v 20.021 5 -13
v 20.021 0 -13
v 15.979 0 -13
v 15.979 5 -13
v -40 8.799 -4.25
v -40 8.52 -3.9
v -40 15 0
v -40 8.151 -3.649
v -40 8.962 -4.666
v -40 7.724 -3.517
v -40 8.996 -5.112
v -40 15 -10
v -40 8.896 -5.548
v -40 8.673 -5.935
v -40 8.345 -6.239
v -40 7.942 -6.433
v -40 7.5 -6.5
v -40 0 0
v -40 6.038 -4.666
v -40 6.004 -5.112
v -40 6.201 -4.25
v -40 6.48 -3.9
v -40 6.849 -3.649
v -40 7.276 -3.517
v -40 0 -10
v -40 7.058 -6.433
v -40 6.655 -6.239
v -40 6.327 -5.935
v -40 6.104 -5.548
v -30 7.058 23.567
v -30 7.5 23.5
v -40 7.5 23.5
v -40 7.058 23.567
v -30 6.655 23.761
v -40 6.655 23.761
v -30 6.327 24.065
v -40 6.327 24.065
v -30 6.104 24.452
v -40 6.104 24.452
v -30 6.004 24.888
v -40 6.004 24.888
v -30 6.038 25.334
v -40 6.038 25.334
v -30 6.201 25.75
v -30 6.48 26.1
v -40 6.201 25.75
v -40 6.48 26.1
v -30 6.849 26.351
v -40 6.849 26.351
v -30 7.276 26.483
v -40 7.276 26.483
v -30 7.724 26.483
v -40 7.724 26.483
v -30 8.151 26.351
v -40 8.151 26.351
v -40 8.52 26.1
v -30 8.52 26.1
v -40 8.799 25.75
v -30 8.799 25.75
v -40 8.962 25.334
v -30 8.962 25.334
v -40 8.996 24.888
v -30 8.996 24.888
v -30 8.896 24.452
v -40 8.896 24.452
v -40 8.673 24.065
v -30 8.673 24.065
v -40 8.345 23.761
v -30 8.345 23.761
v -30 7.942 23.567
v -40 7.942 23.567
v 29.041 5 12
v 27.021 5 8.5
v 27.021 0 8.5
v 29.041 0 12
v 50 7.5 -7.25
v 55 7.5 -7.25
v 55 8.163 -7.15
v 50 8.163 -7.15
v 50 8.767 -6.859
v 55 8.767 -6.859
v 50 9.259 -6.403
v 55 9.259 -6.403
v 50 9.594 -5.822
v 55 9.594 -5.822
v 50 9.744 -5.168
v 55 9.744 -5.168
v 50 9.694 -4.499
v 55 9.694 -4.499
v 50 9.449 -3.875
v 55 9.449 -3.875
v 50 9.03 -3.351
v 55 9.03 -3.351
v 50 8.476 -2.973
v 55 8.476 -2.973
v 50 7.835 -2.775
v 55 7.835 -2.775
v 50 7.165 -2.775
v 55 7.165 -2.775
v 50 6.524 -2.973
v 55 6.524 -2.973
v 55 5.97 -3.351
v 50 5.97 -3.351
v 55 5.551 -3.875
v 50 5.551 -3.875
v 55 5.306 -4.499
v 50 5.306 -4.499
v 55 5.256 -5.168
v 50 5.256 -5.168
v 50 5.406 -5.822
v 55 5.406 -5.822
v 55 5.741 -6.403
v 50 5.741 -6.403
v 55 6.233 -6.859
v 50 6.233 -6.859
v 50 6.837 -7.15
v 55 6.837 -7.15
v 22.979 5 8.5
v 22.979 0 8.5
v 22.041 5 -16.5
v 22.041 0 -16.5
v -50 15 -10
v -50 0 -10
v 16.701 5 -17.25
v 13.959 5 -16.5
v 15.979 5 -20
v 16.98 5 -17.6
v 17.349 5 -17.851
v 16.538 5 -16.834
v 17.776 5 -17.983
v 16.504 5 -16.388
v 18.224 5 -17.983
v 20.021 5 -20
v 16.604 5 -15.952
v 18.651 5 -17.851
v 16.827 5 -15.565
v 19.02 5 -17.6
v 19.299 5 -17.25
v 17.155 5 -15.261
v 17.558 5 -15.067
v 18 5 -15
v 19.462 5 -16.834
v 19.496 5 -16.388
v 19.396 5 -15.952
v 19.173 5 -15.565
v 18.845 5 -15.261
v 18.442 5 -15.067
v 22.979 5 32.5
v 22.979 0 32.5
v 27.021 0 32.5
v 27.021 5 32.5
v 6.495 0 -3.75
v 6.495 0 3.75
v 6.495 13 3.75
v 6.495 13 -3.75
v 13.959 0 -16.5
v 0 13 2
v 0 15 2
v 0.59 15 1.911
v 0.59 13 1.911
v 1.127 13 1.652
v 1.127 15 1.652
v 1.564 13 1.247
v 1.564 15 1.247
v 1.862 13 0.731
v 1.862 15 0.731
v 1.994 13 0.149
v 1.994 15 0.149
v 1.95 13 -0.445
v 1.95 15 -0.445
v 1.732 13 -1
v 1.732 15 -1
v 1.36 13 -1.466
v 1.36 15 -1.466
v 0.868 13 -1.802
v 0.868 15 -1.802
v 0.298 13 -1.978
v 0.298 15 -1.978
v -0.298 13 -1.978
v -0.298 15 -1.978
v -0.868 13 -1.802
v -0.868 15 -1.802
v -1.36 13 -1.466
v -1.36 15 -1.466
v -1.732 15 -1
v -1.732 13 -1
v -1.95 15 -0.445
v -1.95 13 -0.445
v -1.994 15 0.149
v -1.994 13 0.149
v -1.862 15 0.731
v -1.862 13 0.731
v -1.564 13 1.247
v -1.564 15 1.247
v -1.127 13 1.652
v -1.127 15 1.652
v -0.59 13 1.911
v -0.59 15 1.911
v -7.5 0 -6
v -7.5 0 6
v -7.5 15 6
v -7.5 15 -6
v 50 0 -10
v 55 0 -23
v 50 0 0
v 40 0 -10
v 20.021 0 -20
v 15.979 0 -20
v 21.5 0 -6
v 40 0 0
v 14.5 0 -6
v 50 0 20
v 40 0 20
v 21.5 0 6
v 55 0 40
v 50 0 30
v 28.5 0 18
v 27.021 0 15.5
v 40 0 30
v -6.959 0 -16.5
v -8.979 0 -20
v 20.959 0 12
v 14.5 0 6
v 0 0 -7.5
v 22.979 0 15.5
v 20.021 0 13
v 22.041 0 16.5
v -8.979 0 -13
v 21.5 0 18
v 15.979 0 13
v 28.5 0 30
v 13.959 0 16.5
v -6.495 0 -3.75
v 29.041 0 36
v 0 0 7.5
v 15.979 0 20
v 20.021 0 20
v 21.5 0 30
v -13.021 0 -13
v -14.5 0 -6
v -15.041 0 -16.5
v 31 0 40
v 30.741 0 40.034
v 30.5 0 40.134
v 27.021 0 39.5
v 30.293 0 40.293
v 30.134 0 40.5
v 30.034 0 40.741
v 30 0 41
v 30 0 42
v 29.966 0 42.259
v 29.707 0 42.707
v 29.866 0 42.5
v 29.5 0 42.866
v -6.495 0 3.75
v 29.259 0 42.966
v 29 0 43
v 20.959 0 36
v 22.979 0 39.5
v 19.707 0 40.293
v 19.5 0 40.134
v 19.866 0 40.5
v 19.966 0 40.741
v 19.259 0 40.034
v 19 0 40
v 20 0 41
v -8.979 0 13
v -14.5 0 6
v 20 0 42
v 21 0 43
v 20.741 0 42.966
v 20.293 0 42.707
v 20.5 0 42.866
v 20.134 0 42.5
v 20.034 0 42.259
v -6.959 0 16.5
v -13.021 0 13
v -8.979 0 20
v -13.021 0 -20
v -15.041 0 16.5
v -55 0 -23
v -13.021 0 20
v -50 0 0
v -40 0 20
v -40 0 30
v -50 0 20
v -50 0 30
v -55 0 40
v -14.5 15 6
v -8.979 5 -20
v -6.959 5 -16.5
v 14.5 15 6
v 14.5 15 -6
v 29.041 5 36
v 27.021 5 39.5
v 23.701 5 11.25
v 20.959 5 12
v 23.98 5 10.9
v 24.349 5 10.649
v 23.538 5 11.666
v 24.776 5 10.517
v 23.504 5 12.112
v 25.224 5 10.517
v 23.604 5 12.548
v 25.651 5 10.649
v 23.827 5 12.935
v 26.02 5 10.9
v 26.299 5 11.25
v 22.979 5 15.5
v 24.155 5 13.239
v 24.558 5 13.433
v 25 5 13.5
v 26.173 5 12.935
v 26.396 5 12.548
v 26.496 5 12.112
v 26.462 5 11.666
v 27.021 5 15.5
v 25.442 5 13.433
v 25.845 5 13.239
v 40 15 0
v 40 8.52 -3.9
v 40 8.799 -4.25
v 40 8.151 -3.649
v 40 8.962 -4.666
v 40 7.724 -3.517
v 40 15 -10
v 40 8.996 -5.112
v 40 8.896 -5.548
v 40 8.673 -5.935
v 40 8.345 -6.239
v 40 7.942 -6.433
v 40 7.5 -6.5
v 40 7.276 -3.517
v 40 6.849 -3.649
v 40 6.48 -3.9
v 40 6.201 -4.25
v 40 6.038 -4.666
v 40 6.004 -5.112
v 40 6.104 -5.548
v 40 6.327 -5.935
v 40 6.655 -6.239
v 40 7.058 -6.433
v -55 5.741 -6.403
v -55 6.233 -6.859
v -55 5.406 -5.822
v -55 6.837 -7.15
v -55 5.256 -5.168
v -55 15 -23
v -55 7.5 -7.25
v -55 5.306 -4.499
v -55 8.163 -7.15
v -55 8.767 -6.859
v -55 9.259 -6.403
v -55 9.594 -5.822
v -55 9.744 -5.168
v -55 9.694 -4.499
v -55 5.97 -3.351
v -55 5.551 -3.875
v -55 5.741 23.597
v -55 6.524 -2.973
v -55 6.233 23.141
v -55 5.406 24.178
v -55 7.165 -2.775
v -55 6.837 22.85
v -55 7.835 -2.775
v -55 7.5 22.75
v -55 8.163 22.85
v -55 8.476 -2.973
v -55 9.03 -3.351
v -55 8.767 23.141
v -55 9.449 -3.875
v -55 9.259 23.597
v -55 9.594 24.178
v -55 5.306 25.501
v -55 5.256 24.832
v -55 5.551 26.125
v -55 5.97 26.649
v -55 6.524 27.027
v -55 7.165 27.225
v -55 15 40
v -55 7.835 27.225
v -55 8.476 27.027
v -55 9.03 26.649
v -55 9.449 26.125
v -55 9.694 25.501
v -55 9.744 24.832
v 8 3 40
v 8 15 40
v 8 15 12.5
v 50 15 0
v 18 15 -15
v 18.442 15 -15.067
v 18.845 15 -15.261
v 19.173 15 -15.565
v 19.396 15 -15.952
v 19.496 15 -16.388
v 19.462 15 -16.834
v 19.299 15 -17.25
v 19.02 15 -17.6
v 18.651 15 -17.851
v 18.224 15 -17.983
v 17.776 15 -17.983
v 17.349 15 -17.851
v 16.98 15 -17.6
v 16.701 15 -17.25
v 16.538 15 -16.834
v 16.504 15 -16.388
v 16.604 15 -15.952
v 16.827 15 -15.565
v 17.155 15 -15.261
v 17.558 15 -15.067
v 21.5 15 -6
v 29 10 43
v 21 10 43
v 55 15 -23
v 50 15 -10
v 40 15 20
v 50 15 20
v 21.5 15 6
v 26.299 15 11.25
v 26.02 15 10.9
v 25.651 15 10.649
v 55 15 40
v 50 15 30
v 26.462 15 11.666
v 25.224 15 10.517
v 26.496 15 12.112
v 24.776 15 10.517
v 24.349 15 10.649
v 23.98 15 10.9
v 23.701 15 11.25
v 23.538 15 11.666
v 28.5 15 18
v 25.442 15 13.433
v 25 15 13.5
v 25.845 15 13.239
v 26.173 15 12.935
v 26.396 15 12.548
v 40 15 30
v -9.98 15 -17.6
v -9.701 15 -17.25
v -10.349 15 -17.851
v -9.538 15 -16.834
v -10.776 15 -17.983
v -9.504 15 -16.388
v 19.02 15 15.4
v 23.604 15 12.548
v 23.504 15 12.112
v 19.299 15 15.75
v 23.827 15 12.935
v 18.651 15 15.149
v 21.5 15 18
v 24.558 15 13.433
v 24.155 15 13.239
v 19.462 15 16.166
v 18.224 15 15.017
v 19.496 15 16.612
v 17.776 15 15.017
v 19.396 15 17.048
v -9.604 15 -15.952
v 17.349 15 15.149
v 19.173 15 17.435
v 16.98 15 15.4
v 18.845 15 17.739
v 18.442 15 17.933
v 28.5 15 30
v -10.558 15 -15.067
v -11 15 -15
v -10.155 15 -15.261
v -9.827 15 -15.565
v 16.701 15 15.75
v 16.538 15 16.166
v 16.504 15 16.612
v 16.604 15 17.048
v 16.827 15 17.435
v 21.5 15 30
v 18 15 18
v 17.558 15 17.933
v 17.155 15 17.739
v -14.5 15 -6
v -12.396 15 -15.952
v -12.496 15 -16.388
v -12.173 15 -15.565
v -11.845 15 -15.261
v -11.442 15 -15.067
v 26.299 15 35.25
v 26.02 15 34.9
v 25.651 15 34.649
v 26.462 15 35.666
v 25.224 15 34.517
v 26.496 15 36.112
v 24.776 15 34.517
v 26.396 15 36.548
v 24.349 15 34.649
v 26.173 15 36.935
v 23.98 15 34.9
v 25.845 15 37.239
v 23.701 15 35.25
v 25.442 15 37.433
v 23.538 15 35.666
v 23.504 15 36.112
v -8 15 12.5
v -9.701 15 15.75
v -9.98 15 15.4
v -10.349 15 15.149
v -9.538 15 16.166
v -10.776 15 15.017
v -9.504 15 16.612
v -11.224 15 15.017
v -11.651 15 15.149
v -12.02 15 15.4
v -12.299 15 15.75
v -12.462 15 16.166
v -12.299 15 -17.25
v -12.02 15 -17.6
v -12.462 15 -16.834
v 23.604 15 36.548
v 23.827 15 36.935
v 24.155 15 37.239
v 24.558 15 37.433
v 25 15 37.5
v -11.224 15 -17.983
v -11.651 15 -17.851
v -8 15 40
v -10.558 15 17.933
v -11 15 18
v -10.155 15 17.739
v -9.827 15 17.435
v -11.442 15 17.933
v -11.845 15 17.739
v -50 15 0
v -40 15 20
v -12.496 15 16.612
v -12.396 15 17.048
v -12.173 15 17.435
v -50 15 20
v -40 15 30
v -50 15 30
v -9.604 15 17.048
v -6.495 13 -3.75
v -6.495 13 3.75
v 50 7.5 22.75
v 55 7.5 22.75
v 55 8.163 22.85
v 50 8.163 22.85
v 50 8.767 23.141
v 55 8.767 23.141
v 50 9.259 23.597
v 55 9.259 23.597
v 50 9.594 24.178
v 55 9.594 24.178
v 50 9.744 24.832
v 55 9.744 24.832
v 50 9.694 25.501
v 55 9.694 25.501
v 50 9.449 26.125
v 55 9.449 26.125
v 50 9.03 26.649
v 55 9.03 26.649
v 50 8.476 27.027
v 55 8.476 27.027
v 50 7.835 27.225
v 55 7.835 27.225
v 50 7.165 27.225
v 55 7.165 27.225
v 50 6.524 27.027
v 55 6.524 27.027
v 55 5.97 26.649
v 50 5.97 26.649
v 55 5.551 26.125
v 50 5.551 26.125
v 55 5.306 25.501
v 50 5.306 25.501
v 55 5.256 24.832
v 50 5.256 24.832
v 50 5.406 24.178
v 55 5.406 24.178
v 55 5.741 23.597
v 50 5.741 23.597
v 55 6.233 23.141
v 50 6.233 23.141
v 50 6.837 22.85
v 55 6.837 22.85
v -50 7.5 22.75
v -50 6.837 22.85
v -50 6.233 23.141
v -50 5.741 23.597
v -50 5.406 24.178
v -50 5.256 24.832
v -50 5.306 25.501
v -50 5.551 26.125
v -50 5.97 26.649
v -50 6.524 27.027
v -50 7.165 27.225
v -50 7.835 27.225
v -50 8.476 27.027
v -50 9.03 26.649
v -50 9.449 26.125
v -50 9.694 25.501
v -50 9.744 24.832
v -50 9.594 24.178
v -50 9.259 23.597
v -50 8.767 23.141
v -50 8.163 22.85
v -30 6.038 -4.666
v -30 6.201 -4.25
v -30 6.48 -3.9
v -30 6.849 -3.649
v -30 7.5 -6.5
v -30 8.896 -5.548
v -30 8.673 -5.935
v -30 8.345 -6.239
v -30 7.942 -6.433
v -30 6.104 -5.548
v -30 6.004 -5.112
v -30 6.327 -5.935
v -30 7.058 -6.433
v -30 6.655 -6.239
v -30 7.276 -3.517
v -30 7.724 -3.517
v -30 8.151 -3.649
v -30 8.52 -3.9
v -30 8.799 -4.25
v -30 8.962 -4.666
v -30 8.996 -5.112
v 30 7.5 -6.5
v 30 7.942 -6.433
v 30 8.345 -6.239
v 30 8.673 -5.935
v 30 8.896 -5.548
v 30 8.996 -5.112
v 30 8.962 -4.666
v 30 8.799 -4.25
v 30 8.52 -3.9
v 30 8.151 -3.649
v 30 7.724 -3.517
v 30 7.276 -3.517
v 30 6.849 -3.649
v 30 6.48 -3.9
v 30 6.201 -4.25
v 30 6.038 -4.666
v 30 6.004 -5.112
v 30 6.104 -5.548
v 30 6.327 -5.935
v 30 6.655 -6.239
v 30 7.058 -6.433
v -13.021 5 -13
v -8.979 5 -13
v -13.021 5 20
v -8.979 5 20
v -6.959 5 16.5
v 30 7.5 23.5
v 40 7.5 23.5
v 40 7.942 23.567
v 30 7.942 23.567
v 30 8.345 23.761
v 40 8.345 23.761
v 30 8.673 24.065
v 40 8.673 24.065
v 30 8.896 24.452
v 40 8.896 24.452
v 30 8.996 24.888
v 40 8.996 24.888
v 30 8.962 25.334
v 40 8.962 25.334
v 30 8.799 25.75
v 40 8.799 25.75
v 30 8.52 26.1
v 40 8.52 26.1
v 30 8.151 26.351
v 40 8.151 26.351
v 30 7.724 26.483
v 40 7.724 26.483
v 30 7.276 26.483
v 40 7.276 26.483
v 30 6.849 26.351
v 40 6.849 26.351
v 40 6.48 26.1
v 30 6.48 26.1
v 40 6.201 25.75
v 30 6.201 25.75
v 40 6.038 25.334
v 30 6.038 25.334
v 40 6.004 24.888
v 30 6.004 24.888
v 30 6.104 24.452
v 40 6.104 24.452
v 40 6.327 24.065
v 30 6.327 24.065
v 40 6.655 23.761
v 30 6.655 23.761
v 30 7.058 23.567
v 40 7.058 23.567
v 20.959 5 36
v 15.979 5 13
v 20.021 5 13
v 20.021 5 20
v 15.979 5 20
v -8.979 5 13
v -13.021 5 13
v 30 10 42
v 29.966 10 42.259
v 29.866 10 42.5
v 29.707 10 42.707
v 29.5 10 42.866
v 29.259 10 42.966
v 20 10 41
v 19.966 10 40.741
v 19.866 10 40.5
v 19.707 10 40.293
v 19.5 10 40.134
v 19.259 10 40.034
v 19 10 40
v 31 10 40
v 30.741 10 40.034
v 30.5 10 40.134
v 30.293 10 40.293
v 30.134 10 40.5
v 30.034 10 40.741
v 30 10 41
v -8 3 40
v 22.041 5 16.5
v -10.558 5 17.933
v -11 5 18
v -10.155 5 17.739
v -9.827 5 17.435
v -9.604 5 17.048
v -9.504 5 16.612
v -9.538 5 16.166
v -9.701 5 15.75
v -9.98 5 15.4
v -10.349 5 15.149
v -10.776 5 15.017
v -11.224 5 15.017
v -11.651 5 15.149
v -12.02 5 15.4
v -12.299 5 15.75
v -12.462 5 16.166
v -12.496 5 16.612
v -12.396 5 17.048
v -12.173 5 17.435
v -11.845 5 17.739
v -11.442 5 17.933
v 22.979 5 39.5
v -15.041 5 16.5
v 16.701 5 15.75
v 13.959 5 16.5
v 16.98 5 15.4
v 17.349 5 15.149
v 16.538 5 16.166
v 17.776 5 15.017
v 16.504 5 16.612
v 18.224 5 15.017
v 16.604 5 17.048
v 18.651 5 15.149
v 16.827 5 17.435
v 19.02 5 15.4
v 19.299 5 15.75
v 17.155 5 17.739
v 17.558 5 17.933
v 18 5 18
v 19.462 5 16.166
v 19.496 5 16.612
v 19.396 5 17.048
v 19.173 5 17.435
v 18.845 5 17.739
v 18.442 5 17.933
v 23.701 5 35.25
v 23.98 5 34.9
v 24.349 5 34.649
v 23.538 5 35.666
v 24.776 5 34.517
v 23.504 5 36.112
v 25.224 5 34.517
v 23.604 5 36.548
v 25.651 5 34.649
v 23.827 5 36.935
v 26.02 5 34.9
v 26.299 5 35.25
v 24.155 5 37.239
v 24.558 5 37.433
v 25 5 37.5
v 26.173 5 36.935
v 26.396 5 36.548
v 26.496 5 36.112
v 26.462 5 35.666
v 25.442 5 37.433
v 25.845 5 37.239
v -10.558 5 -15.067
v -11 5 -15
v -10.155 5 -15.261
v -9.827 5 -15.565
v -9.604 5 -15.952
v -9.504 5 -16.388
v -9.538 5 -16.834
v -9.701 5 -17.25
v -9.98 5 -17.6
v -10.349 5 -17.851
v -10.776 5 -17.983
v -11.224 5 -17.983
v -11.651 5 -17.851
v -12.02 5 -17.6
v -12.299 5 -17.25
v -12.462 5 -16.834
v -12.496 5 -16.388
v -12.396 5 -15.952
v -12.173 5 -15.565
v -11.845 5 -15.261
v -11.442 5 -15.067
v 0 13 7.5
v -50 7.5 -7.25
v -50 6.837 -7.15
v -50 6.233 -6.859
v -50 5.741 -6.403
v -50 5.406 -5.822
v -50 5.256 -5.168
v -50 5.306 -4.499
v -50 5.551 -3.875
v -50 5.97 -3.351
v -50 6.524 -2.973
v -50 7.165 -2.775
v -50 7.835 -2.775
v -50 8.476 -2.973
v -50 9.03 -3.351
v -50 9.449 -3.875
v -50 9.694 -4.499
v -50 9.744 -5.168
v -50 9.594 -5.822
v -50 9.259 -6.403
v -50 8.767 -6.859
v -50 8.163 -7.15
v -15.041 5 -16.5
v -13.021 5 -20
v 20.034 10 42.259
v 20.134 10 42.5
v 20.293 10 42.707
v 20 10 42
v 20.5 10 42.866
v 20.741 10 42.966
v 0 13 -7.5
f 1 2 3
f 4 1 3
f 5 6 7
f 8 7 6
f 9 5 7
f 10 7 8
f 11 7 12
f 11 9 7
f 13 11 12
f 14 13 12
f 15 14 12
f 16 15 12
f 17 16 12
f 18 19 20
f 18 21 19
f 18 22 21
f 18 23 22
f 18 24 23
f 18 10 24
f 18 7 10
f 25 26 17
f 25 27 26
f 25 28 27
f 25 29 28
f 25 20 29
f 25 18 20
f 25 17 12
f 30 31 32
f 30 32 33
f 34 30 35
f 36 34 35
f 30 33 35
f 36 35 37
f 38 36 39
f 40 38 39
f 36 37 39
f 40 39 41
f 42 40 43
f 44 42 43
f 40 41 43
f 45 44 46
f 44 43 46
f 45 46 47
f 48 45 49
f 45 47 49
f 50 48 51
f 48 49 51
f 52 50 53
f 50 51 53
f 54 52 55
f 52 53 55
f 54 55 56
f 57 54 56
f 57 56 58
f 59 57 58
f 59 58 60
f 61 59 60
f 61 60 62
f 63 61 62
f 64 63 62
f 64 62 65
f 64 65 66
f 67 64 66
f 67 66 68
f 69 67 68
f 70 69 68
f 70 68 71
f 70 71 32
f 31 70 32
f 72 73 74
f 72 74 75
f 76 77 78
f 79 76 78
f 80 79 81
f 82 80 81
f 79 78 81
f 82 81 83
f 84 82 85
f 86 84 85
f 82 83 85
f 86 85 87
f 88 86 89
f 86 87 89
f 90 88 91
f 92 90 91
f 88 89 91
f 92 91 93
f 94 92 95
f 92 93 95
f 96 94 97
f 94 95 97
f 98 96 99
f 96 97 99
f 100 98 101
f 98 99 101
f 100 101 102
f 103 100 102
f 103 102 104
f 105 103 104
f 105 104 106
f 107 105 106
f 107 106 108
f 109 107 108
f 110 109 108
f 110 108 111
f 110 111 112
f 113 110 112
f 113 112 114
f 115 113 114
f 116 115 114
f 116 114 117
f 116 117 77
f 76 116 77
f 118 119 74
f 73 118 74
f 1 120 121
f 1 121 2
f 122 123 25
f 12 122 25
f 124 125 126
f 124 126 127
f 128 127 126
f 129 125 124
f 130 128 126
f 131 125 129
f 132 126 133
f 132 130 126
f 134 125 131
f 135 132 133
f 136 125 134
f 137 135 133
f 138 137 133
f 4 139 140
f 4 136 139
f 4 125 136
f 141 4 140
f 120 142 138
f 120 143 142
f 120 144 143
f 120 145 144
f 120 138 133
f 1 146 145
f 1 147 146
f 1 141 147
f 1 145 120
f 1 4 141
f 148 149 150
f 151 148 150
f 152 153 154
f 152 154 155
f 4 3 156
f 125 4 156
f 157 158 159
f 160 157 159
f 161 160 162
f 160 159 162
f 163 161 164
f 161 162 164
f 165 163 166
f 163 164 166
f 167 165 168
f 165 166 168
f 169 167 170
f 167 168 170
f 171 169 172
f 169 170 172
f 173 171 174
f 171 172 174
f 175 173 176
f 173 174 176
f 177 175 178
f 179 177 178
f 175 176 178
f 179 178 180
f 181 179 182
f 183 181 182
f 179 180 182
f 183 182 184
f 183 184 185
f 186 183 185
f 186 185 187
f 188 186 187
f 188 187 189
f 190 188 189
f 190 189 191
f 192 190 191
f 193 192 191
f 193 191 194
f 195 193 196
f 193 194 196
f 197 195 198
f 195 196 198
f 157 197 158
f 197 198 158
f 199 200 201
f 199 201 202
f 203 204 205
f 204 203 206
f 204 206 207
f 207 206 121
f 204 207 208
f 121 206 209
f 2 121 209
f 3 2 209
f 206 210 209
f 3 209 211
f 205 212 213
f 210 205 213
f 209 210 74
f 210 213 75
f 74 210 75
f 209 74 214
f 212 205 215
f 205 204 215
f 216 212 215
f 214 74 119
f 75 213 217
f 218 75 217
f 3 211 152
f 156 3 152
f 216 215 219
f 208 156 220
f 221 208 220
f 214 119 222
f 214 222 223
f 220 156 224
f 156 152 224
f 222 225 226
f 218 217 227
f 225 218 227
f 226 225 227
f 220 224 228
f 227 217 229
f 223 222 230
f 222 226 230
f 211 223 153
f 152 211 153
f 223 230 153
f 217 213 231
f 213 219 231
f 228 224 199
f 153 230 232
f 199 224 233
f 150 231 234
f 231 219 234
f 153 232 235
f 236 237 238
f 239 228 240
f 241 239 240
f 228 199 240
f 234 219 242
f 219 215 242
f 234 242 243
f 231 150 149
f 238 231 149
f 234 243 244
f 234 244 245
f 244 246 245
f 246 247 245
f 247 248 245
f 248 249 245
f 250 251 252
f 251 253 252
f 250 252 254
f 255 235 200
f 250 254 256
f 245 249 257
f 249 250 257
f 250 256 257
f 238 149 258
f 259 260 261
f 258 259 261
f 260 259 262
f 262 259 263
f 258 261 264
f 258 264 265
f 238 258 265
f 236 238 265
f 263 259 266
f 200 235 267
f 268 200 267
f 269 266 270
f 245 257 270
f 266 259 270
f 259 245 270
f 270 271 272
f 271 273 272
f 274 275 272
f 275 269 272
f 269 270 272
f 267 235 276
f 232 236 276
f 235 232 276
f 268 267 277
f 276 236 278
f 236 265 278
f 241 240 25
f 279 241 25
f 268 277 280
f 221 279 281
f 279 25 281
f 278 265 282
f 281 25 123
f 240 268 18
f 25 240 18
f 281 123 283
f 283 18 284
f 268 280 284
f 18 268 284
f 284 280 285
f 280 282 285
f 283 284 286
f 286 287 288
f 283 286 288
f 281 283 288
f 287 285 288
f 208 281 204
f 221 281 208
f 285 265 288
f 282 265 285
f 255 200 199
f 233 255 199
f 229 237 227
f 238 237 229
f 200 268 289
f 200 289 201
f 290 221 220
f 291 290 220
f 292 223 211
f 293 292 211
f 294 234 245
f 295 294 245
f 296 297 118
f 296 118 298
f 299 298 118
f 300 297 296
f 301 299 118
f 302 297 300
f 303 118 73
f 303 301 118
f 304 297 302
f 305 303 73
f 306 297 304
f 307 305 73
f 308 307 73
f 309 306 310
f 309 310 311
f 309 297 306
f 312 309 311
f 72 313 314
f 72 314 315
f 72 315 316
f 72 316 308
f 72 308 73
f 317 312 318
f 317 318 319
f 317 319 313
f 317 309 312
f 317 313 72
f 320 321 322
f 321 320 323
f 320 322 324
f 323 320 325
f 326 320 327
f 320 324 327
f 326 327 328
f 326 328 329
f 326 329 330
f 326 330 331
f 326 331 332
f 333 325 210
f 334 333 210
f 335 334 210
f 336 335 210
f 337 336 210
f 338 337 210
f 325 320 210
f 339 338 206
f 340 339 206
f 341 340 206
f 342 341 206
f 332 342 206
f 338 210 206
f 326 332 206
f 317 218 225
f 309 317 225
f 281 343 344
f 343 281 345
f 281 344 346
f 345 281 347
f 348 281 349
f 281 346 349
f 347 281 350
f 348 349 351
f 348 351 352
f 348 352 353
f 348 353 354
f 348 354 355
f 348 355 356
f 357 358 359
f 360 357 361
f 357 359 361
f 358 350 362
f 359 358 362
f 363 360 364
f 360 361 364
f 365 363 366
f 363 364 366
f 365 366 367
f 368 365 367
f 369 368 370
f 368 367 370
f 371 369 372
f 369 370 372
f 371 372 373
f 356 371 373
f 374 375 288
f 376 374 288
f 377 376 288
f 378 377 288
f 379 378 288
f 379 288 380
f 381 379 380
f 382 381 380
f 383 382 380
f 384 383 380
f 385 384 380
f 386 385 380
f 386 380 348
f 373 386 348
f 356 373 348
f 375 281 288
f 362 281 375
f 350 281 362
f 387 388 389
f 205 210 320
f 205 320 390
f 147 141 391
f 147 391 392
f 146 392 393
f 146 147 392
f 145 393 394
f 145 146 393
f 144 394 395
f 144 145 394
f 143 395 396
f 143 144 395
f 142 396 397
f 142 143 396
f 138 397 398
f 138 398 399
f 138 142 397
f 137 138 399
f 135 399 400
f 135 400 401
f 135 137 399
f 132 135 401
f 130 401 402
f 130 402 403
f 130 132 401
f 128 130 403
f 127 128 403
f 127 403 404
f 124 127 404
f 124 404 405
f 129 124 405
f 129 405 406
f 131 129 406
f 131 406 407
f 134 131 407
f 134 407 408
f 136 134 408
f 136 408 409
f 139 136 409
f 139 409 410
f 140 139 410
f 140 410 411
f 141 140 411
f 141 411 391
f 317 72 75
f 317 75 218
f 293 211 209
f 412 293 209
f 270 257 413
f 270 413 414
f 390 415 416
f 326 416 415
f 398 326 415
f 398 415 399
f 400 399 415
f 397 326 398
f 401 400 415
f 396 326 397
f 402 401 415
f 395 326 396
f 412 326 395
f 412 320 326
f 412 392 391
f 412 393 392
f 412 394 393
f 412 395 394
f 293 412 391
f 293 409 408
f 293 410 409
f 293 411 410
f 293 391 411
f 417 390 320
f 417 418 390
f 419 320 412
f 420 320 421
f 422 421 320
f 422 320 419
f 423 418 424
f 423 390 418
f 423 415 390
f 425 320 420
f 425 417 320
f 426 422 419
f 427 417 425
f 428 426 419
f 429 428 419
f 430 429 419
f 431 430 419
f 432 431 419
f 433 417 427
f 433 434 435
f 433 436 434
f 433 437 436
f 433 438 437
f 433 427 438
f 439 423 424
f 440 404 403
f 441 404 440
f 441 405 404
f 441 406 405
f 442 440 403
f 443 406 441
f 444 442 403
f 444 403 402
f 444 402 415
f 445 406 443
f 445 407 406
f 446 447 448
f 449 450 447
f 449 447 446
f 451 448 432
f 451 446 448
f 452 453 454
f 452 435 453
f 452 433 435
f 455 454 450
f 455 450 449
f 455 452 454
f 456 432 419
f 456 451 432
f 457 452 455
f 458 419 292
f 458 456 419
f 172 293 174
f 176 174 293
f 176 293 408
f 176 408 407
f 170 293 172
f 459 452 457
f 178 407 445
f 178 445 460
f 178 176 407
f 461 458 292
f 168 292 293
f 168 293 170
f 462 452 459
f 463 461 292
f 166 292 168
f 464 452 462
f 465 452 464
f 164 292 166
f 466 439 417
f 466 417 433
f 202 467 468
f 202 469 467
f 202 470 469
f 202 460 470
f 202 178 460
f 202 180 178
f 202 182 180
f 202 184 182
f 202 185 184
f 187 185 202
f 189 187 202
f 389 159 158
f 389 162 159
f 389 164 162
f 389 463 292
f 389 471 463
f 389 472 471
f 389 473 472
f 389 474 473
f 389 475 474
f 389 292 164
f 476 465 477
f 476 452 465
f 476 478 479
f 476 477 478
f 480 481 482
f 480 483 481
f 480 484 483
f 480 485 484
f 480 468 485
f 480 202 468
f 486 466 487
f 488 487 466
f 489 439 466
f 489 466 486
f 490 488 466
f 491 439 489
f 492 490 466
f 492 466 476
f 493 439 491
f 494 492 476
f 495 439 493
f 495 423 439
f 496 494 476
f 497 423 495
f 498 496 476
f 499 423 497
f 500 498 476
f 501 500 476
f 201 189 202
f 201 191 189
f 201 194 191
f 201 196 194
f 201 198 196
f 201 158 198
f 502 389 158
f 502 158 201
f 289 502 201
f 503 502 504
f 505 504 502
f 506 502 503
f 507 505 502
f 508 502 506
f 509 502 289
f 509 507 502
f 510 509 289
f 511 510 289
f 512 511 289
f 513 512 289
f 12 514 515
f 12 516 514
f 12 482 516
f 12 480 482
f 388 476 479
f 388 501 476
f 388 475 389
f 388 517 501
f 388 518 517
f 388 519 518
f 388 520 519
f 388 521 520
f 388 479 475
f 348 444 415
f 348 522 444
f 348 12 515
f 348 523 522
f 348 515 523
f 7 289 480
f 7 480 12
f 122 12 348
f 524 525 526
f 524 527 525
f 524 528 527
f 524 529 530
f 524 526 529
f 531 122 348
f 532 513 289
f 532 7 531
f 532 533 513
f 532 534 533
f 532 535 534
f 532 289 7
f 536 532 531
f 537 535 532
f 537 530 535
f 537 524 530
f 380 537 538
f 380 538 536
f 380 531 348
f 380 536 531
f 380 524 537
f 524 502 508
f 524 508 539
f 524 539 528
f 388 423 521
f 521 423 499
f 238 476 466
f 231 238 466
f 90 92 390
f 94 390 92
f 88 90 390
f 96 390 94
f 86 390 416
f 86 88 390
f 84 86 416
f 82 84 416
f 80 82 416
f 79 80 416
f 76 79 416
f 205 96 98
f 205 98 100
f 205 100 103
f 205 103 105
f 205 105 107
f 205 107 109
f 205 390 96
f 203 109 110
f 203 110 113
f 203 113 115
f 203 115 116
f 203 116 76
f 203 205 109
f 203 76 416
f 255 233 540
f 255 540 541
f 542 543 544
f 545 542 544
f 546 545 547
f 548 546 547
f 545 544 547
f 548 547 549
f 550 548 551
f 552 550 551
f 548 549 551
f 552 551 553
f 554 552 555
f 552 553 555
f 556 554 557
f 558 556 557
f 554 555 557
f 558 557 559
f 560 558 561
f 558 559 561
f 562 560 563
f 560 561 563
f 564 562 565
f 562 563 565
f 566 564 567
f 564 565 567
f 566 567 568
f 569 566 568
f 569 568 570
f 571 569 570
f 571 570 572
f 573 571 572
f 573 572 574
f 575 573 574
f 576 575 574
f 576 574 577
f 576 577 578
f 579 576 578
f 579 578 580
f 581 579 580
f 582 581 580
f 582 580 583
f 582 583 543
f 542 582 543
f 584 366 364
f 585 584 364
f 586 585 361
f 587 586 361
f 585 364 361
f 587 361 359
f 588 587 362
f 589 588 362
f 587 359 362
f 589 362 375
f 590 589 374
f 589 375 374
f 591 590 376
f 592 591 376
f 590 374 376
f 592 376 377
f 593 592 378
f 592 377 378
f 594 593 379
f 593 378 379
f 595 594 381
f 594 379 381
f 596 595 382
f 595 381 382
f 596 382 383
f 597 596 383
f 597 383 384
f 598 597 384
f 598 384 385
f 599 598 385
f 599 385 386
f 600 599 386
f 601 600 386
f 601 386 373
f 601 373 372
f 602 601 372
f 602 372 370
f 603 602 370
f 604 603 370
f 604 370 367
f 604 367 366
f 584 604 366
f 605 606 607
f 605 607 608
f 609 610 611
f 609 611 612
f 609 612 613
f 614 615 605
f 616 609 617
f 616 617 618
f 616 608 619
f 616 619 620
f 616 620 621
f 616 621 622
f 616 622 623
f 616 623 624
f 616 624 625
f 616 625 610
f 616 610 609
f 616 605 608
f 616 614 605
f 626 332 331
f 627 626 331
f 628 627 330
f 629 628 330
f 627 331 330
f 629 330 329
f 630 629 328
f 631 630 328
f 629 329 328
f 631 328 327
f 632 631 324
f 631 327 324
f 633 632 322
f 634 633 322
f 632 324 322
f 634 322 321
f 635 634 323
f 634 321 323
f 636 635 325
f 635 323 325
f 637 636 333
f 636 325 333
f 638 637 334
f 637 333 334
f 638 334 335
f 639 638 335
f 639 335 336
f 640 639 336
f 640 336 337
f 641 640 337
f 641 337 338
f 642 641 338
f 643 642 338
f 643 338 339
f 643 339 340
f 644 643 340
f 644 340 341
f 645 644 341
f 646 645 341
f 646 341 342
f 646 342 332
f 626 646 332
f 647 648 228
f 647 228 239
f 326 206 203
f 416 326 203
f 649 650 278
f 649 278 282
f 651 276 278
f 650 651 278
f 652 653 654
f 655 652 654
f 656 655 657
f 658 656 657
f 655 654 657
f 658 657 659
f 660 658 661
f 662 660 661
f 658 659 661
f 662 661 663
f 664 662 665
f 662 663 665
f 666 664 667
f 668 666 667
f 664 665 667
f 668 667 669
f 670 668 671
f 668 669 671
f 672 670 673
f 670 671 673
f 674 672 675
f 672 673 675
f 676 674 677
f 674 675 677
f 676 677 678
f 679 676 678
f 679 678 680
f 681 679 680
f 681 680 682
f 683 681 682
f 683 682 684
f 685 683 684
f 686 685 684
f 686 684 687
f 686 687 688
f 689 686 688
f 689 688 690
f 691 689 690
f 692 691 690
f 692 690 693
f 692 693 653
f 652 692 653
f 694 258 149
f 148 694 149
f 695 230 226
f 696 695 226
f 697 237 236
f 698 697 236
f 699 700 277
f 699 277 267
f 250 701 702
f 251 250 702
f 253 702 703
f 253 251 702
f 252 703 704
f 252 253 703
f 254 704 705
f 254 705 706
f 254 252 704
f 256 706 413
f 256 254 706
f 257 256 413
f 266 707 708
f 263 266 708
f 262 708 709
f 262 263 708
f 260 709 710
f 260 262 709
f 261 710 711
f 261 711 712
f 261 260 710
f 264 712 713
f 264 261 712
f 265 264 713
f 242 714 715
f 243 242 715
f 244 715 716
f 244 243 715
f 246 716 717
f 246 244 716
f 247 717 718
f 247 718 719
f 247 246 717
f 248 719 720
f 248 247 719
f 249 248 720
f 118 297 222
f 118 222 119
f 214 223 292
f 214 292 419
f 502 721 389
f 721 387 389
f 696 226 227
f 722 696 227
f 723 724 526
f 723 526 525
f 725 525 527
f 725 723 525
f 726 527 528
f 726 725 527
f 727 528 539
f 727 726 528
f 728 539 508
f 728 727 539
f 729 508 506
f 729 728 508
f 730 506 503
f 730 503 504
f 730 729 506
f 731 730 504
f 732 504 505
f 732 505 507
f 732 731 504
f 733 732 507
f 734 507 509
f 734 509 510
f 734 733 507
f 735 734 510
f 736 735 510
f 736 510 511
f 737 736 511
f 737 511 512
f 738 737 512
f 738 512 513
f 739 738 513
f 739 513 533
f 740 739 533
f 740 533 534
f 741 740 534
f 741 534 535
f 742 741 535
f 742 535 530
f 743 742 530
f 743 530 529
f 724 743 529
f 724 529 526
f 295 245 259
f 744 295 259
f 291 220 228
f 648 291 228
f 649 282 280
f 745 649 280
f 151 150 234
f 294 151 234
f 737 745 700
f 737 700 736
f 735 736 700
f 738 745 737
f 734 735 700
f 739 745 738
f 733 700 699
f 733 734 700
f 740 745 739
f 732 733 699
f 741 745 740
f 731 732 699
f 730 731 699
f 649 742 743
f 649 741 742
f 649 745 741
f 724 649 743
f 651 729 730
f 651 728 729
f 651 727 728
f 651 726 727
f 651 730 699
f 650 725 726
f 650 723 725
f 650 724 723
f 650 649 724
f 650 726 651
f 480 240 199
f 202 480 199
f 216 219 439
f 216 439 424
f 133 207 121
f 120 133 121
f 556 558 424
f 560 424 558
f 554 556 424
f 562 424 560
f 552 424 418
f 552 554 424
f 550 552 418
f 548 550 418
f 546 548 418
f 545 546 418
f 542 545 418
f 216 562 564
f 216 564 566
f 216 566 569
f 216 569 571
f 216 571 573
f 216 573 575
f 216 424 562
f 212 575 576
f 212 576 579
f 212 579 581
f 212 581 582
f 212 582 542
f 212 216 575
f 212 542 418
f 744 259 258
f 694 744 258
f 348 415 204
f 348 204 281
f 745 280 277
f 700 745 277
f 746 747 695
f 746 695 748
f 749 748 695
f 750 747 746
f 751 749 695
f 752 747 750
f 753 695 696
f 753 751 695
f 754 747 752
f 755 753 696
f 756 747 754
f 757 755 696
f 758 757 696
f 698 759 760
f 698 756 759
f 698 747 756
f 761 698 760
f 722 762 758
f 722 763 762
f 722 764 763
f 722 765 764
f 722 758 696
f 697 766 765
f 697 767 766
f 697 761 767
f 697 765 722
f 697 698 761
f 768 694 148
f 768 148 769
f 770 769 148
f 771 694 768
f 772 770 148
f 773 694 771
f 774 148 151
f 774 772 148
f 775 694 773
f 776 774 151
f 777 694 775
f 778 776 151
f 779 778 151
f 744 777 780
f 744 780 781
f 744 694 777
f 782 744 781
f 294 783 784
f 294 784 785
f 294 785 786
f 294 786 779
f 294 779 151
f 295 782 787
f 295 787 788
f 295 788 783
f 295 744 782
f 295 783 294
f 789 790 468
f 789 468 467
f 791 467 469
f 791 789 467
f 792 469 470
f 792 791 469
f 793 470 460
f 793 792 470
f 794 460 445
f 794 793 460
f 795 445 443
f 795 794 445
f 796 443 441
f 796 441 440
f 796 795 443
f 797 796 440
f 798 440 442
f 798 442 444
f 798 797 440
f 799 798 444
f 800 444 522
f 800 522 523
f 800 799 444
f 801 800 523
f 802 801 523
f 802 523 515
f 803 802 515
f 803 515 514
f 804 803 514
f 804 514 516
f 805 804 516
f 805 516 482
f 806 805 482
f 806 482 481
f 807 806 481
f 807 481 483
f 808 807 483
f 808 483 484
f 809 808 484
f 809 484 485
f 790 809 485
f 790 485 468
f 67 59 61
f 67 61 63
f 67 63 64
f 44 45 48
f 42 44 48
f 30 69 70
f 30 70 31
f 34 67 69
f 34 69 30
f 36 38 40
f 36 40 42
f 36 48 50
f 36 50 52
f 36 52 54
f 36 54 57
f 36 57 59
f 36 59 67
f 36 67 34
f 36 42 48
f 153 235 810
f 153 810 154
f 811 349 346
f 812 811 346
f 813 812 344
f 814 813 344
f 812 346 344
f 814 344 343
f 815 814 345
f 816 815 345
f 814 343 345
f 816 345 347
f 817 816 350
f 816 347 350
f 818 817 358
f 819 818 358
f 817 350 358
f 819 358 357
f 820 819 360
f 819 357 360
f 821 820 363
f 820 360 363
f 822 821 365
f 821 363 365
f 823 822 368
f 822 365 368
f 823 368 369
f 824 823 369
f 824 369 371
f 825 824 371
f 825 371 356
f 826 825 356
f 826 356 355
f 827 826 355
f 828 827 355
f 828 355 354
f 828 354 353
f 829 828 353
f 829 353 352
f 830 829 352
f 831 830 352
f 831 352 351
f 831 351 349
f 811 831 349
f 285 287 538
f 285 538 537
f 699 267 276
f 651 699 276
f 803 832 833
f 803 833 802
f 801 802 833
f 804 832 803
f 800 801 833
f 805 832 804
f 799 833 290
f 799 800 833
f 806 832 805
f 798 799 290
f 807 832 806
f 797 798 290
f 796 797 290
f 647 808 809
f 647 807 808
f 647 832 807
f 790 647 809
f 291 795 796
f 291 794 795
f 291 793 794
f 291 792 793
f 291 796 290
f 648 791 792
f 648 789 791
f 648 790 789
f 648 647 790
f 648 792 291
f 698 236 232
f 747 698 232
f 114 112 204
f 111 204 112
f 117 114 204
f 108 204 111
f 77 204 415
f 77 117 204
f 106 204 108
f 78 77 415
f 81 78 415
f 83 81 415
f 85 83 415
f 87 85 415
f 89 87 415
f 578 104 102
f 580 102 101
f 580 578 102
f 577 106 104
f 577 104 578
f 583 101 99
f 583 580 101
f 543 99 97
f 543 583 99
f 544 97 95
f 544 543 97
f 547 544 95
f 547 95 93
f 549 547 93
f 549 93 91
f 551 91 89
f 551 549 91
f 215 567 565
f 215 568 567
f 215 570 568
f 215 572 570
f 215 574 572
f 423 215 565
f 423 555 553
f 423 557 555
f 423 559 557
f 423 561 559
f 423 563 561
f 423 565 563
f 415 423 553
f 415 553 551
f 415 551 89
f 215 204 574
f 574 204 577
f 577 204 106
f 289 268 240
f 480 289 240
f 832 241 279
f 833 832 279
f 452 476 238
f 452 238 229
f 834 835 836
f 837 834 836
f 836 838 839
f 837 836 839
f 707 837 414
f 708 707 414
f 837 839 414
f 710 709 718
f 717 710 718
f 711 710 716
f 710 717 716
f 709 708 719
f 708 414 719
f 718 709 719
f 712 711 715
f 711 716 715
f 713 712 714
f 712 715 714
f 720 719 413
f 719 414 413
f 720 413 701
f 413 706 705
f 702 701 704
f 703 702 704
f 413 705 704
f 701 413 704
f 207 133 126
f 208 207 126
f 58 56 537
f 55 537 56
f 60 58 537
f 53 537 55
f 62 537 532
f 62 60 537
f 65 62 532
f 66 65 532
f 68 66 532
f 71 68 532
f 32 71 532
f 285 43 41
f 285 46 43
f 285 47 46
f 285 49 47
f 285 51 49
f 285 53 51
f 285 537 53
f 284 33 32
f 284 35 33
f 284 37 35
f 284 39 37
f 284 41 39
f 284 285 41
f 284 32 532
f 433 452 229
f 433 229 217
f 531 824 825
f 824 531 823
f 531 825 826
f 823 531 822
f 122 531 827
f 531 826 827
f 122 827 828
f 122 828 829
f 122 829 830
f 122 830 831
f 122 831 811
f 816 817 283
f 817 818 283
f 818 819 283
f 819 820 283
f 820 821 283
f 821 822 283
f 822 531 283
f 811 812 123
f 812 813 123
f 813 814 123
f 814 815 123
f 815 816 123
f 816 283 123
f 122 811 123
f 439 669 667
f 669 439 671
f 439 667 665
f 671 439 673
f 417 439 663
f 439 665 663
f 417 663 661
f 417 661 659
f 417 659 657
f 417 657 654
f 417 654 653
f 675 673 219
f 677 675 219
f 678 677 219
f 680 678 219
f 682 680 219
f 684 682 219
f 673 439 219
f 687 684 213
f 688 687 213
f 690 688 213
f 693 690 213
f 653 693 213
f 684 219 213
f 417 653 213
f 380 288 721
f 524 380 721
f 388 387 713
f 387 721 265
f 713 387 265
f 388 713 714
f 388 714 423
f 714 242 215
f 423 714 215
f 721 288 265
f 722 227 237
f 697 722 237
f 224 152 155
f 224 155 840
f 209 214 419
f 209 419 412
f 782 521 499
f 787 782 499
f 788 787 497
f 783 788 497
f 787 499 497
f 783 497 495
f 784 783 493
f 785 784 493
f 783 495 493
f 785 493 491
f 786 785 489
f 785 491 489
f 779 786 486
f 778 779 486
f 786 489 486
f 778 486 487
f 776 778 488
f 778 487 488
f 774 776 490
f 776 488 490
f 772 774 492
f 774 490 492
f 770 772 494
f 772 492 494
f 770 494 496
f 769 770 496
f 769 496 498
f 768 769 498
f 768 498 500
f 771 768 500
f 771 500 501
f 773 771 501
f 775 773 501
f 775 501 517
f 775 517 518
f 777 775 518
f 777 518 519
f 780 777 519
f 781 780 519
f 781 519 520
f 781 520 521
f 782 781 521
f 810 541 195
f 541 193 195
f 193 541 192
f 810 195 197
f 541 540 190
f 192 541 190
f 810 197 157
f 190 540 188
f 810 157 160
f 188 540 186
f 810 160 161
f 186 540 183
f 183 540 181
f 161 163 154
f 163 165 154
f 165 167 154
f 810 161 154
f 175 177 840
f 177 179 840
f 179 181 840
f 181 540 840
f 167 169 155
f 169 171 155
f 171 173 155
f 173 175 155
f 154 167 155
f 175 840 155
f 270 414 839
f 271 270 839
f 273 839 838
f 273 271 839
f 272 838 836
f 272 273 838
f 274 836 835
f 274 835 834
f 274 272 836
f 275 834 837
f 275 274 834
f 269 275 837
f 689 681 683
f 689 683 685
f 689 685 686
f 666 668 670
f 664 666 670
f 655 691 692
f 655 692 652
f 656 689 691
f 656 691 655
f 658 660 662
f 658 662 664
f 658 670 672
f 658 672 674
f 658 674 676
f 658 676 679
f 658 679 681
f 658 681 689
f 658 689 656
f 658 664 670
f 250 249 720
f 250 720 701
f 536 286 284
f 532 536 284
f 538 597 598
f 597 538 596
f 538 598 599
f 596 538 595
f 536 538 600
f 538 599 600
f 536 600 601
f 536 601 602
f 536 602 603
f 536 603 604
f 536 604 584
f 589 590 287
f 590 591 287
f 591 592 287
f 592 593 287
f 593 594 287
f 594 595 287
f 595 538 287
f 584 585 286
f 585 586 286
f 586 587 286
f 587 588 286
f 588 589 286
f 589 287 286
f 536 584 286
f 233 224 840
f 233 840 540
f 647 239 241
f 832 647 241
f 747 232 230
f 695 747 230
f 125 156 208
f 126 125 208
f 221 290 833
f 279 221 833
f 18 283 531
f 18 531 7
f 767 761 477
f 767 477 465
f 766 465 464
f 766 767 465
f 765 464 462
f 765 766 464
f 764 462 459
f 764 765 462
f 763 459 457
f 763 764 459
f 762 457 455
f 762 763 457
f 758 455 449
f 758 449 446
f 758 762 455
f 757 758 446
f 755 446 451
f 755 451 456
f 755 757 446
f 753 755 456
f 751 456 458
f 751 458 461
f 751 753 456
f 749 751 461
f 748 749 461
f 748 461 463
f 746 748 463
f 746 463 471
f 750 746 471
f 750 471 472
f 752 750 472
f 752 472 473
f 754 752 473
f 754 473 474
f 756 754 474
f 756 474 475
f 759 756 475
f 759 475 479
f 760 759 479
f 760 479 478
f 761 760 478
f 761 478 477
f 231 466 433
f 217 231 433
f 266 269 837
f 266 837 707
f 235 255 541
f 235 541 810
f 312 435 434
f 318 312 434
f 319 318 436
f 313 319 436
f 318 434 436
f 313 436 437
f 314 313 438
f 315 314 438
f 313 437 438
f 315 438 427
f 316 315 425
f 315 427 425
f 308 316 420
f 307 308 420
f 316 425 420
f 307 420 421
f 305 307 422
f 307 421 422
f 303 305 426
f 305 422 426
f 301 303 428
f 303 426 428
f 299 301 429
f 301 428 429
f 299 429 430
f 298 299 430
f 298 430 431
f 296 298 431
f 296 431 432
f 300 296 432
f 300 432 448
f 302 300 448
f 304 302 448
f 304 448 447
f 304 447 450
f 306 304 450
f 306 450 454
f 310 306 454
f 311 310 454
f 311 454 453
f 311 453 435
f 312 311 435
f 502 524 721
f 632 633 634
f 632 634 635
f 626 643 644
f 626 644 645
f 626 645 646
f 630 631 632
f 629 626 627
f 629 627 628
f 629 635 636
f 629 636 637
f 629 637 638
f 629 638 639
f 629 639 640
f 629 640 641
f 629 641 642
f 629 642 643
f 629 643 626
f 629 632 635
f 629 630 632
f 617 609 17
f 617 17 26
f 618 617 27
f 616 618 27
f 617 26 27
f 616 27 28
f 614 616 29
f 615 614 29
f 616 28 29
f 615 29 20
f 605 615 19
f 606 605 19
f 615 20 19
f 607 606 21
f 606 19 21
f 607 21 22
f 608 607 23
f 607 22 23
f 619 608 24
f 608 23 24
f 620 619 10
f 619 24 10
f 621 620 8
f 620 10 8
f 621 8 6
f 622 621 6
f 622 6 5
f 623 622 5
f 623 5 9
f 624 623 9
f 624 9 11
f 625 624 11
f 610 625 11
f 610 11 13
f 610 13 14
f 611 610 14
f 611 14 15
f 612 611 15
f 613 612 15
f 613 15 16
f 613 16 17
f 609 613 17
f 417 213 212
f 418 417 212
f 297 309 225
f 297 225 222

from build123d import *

# Parameters (mm, degrees)
CROQUIS1_W              = 80
CROQUIS1_H              = 60
CROQUIS1_R              = 1.5
CROQUIS1_W_2            = 7
CROQUIS1_H_2            = 25
CROQUIS1_W_3            = 10
CROQUIS1_H_3            = 20
CROQUIS1_H_4            = 10
CROQUIS1_W_4            = 5
CROQUIS1_H_5            = 6.5
SALIENTE_EXTRUIR1_DEPTH = 15
CORTAR_EXTRUIR1_DEPTH   = 5
CROQUIS3_R              = 1.5
CORTAR_EXTRUIR2_DEPTH   = 25
CROQUIS6_R              = 1.5
CORTAR_EXTRUIR3_DEPTH   = 25
CROQUIS8_W              = 15
CROQUIS8_H              = 17.838651154
CROQUIS8_R              = 2
SALIENTE_EXTRUIR2_DEPTH = 2
CORTAR_EXTRUIR4_START   = -55
CORTAR_EXTRUIR4_DEPTH   = 8
CROQUIS10_R             = 1.5
CROQUIS10_W             = 7
CROQUIS10_H             = 12
CORTAR_EXTRUIR5_DEPTH   = 16
CROQUIS12_W             = 110
CROQUIS12_H             = 15
SALIENTE_EXTRUIR3_DEPTH = 3
CORTAR_EXTRUIR6_DEPTH   = 5
SALIENTE_EXTRUIR4_DEPTH = 10
CROQUIS15_R             = 2.25
CORTAR_EXTRUIR7_DEPTH   = 10
CROQUIS16_R             = 2.25
CORTAR_EXTRUIR8_DEPTH   = 10


with BuildPart() as part:
    # Croquis1 → Saliente-Extruir1 (new body)
    with BuildSketch(Plane(origin=(0, 0, 0), x_dir=(1, 0, 0), z_dir=(0, 1, 0))):
        with Locations((0, -10)):
            Rectangle(CROQUIS1_W, CROQUIS1_H)
        with Locations(Location((18, -16.5, 0), (0, 0, 270))):
            Circle(CROQUIS1_R, mode=Mode.SUBTRACT)
        with Locations(Location((-11, -16.5, 0), (0, 0, 270))):
            Circle(CROQUIS1_R, mode=Mode.SUBTRACT)
        with Locations(Location((18, 16.5, 0), (0, 0, 270))):
            Circle(CROQUIS1_R, mode=Mode.SUBTRACT)
        with Locations(Location((-11, 16.5, 0), (0, 0, 270))):
            Circle(CROQUIS1_R, mode=Mode.SUBTRACT)
        with Locations((18, 0)):
            Rectangle(CROQUIS1_W_2, CROQUIS1_H_2, mode=Mode.SUBTRACT)
        Polygon((6.495190528, 3.75), (0, 7.5), (-6.495190528, 3.75), (-6.495190528, -3.75), (0, -7.5), (6.495190528, -3.75), align=None, mode=Mode.SUBTRACT)
        with Locations((-11, 0)):
            Rectangle(CROQUIS1_W_2, CROQUIS1_H_2, mode=Mode.SUBTRACT)
        with Locations((-45, -10)):
            Rectangle(CROQUIS1_W_3, CROQUIS1_H_3)
        with Locations((-45, -35)):
            Rectangle(CROQUIS1_W_3, CROQUIS1_H_4)
        with Locations((-52.5, -10)):
            Rectangle(CROQUIS1_W_4, CROQUIS1_H)
        with Locations((-45, 15)):
            Rectangle(CROQUIS1_W_3, CROQUIS1_H_4)
        with Locations((45, 15)):
            Rectangle(CROQUIS1_W_3, CROQUIS1_H_4)
        with Locations((52.5, -10)):
            Rectangle(CROQUIS1_W_4, CROQUIS1_H)
        with Locations((45, -10)):
            Rectangle(CROQUIS1_W_3, CROQUIS1_H_3)
        with Locations((45, -35)):
            Rectangle(CROQUIS1_W_3, CROQUIS1_H_4)
        with Locations((-11, 9.25)):
            Rectangle(CROQUIS1_W_2, CROQUIS1_H_5)
        with Locations((-11, -9.25)):
            Rectangle(CROQUIS1_W_2, CROQUIS1_H_5)
        with Locations((18, 9.25)):
            Rectangle(CROQUIS1_W_2, CROQUIS1_H_5)
        with Locations((18, -9.25)):
            Rectangle(CROQUIS1_W_2, CROQUIS1_H_5)
    extrude(amount=SALIENTE_EXTRUIR1_DEPTH)

    # Croquis2 → Cortar-Extruir1 (cut)
    with BuildSketch(Plane.XZ):
        Polygon((-6.958548116, 16.5), (-8.979274058, 20), (-13.020725942, 20), (-15.041451884, 16.5), (-13.020725942, 13), (-8.979274058, 13), align=None)
        Polygon((22.041451884, 16.5), (20.020725942, 20), (15.979274058, 20), (13.958548116, 16.5), (15.979274058, 13), (20.020725942, 13), align=None)
        Polygon((-6.958548116, -16.5), (-8.979274058, -13), (-13.020725942, -13), (-15.041451884, -16.5), (-13.020725942, -20), (-8.979274058, -20), align=None)
        Polygon((22.041451884, -16.5), (20.020725942, -13), (15.979274058, -13), (13.958548116, -16.5), (15.979274058, -20), (20.020725942, -20), align=None)
    extrude(amount=-CORTAR_EXTRUIR1_DEPTH, mode=Mode.SUBTRACT)

    # Croquis3 → Cortar-Extruir2 (cut)
    with BuildSketch(Plane(origin=(55, 0, 0), x_dir=(0, 0, -1), z_dir=(1, 0, 0))):
        with Locations((-25, 7.5)):
            Circle(CROQUIS3_R)
        with Locations((5, 7.5)):
            Circle(CROQUIS3_R)
    extrude(amount=-CORTAR_EXTRUIR2_DEPTH, mode=Mode.SUBTRACT)

    # Croquis6 → Cortar-Extruir3 (cut)
    with BuildSketch(Plane.ZY.offset(55)):
        with Locations(Location((-5, 7.5, 0), (0, 0, 180))):
            Circle(CROQUIS6_R)
        with Locations(Location((25, 7.5, 0), (0, 0, 180))):
            Circle(CROQUIS6_R)
    extrude(amount=-CORTAR_EXTRUIR3_DEPTH, mode=Mode.SUBTRACT)

    # Croquis8 → Saliente-Extruir2 (add)
    with BuildSketch(Plane(origin=(0, 15, 0), x_dir=(1, 0, 0), z_dir=(0, 1, 0))):
        Rectangle(CROQUIS8_W, CROQUIS8_H)
        with Locations(Location((0, 0, 0), (0, 0, 270))):
            Circle(CROQUIS8_R, mode=Mode.SUBTRACT)
    extrude(amount=-SALIENTE_EXTRUIR2_DEPTH)

    # Croquis9 → Cortar-Extruir4 (cut, symmetric)
    with BuildSketch(Plane(origin=(55, 0, 0), x_dir=(0, 0, -1), z_dir=(1, 0, 0)).offset(CORTAR_EXTRUIR4_START)):
        Polygon((-40, 3), (-12.5, 15), (-40, 15), align=None)
    extrude(amount=CORTAR_EXTRUIR4_DEPTH, both=True, mode=Mode.SUBTRACT)

    # Croquis10 → Cortar-Extruir5 (cut)
    with BuildSketch(Plane(origin=(0, 15, 0), x_dir=(1, 0, 0), z_dir=(0, 1, 0))):
        with Locations(Location((25, -12, 0), (0, 0, 270))):
            Circle(CROQUIS10_R)
        with Locations(Location((25, -36, 0), (0, 0, 270))):
            Circle(CROQUIS10_R)
        with Locations((25, -24)):
            Rectangle(CROQUIS10_W, CROQUIS10_H)
    extrude(amount=-CORTAR_EXTRUIR5_DEPTH, mode=Mode.SUBTRACT)

    # Croquis12 → Saliente-Extruir3 (add)
    with BuildSketch(Plane(origin=(0, 0, -20), x_dir=(-1, 0, 0), z_dir=(0, 0, -1))):
        with Locations((0, 7.5)):
            Rectangle(CROQUIS12_W, CROQUIS12_H)
    extrude(amount=SALIENTE_EXTRUIR3_DEPTH)

    # Croquis13 → Cortar-Extruir6 (cut)
    with BuildSketch(Plane.XZ):
        Polygon((29.041451884, 12), (27.020725942, 15.5), (22.979274058, 15.5), (20.958548116, 12), (22.979274058, 8.5), (27.020725942, 8.5), align=None)
        Polygon((29.041451884, 36), (27.020725942, 39.5), (22.979274058, 39.5), (20.958548116, 36), (22.979274058, 32.5), (27.020725942, 32.5), align=None)
    extrude(amount=-CORTAR_EXTRUIR6_DEPTH, mode=Mode.SUBTRACT)

    # Croquis14 → Saliente-Extruir4 (add)
    with BuildSketch(Plane.XZ):
        with BuildLine():
            Line((30, 41), (30, 42))
            ThreePointArc((30, 42), (29.707106781, 42.707106781), (29, 43))
            Line((29, 43), (21, 43))
            ThreePointArc((21, 43), (20.292893219, 42.707106781), (20, 42))
            Line((20, 42), (20, 41))
            ThreePointArc((20, 41), (19.707106781, 40.292893219), (19, 40))
            Line((19, 40), (31, 40))
            ThreePointArc((31, 40), (30.292893219, 40.292893219), (30, 41))
        make_face()
    extrude(amount=-SALIENTE_EXTRUIR4_DEPTH)

    # Croquis15 → Cortar-Extruir7 (cut)
    with BuildSketch(Plane(origin=(55, 0, 0), x_dir=(0, 0, -1), z_dir=(1, 0, 0))):
        with Locations((-25, 7.5)):
            Circle(CROQUIS15_R)
        with Locations((5, 7.5)):
            Circle(CROQUIS15_R)
    extrude(amount=-CORTAR_EXTRUIR7_DEPTH, mode=Mode.SUBTRACT)

    # Croquis16 → Cortar-Extruir8 (cut)
    with BuildSketch(Plane.ZY.offset(55)):
        with Locations(Location((-5, 7.5, 0), (0, 0, 180))):
            Circle(CROQUIS16_R)
        with Locations(Location((25, 7.5, 0), (0, 0, 180))):
            Circle(CROQUIS16_R)
    extrude(amount=-CORTAR_EXTRUIR8_DEPTH, mode=Mode.SUBTRACT)


solid = part.part
